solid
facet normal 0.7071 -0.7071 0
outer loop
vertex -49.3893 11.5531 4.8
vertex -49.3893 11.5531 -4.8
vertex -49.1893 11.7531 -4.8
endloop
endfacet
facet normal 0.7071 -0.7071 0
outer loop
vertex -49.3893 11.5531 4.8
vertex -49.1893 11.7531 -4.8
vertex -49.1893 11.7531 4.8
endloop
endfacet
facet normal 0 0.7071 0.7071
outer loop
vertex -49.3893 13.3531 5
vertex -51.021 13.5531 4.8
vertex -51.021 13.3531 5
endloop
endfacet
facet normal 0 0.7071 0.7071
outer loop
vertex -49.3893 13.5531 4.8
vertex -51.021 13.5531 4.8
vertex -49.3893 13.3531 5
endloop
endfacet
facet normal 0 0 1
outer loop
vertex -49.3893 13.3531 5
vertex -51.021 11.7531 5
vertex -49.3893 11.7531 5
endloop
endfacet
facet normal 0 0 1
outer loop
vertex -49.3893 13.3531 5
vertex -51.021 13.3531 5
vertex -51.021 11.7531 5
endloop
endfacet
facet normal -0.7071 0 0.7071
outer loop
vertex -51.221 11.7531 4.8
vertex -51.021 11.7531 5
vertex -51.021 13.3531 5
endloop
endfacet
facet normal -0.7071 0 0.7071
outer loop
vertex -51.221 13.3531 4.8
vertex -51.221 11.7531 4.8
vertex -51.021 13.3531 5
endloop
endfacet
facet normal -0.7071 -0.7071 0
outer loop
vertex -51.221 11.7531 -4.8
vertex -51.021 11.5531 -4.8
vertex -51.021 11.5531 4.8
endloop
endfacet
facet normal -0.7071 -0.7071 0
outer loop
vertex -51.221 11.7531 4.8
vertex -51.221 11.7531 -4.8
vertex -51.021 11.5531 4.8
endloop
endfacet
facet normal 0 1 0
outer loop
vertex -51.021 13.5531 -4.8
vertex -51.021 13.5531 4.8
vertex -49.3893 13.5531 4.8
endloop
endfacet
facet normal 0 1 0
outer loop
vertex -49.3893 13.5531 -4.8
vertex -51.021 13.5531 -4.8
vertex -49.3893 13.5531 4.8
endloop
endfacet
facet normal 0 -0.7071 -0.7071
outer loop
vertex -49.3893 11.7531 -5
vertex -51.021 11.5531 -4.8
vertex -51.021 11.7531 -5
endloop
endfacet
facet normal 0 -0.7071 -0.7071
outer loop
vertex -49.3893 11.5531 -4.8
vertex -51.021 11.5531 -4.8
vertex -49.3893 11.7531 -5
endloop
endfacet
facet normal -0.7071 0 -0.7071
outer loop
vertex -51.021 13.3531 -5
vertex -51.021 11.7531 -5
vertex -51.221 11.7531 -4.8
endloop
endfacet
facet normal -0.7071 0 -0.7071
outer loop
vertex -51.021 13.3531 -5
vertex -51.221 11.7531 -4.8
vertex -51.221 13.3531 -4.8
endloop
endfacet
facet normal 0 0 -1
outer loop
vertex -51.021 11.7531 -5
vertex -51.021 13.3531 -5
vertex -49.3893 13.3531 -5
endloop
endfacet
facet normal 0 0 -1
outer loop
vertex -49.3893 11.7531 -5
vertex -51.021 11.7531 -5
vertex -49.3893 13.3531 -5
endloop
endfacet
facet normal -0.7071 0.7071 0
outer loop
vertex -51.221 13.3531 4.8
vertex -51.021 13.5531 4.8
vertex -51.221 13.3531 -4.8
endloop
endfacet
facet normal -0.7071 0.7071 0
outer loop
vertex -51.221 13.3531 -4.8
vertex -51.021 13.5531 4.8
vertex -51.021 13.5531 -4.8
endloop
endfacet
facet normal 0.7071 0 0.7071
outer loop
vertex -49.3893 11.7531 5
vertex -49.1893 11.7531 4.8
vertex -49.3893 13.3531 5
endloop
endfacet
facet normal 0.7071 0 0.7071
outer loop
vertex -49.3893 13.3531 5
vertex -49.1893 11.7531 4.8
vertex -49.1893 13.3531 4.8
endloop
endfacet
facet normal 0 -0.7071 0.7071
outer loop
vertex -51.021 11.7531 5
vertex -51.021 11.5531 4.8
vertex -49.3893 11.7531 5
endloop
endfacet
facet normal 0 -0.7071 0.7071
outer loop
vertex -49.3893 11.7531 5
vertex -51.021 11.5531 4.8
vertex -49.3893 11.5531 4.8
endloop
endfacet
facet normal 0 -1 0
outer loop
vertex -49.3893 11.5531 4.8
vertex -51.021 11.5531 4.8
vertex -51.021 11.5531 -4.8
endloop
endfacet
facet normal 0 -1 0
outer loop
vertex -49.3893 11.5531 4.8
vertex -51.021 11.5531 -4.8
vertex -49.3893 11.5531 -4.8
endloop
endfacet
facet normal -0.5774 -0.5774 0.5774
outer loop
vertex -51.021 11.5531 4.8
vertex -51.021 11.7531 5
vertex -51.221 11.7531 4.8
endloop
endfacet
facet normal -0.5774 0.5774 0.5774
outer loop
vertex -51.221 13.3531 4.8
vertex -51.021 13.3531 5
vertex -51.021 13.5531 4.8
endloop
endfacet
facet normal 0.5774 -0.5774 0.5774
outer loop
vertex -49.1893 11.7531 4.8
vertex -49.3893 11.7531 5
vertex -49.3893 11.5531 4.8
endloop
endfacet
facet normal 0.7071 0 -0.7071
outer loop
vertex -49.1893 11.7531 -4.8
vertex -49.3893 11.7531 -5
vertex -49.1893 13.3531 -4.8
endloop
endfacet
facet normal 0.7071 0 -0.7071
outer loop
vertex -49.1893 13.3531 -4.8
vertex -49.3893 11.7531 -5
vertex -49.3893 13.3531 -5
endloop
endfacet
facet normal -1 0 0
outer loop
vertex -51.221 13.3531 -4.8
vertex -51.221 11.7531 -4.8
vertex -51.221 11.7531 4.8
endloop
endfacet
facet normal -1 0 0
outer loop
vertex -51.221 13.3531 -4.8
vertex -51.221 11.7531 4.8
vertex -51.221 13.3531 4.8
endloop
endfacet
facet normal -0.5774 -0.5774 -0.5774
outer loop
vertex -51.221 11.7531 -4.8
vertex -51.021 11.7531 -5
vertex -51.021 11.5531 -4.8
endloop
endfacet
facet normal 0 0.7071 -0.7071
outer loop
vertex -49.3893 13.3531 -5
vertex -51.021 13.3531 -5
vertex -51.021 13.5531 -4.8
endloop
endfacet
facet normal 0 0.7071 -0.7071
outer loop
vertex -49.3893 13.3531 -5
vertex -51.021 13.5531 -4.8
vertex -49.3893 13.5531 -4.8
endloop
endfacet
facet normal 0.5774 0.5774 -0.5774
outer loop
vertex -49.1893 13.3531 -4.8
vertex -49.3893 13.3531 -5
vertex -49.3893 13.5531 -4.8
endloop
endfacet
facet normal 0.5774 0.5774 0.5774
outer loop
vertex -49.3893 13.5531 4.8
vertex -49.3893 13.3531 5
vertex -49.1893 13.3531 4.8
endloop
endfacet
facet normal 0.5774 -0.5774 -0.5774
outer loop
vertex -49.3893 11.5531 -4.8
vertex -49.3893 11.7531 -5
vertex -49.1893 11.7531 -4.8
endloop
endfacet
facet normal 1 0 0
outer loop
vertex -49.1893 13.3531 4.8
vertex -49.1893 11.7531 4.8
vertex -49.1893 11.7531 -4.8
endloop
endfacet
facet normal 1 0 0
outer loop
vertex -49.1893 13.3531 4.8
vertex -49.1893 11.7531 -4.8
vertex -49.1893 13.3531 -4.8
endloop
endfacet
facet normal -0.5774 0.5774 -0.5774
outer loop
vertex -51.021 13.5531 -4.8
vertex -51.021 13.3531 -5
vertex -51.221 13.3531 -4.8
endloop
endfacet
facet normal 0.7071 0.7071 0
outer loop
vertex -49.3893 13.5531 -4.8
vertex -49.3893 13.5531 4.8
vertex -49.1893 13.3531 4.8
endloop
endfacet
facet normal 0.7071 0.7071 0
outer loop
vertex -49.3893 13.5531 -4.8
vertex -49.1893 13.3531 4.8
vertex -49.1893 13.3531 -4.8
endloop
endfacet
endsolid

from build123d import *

# Parameters (mm, degrees)
SKETCH1_W           = 2.031754164
SKETCH1_H           = 2
BOSS_EXTRUDE1_DEPTH = 5
CHAMFER1_SIZE       = 0.2


with BuildPart() as part:
    # Sketch1 → Boss-Extrude1 (new body, symmetric)
    with BuildSketch(Plane.XY):
        with Locations((-50.205131276, 12.553058878)):
            Rectangle(SKETCH1_W, SKETCH1_H)
    extrude(amount=BOSS_EXTRUDE1_DEPTH, both=True)

    # Chamfer1
    chamfer1_edges = [part.edges().sort_by_distance(p)[0] for p in [
        (-50.205131276, 11.553058878, 5),
        (-49.189254194, 12.553058878, 5),
        (-50.205131276, 13.553058878, 5),
        (-49.189254194, 12.553058878, -5),
        (-50.205131276, 11.553058878, -5),
        (-51.221008358, 12.553058878, -5),
        (-50.205131276, 13.553058878, -5),
        (-51.221008358, 12.553058878, 5),
        (-49.189254194, 13.553058878, 0),
        (-49.189254194, 11.553058878, 0),
        (-51.221008358, 11.553058878, 0),
        (-51.221008358, 13.553058878, 0),
    ]]
    chamfer(chamfer1_edges, length=CHAMFER1_SIZE)


solid = part.part
